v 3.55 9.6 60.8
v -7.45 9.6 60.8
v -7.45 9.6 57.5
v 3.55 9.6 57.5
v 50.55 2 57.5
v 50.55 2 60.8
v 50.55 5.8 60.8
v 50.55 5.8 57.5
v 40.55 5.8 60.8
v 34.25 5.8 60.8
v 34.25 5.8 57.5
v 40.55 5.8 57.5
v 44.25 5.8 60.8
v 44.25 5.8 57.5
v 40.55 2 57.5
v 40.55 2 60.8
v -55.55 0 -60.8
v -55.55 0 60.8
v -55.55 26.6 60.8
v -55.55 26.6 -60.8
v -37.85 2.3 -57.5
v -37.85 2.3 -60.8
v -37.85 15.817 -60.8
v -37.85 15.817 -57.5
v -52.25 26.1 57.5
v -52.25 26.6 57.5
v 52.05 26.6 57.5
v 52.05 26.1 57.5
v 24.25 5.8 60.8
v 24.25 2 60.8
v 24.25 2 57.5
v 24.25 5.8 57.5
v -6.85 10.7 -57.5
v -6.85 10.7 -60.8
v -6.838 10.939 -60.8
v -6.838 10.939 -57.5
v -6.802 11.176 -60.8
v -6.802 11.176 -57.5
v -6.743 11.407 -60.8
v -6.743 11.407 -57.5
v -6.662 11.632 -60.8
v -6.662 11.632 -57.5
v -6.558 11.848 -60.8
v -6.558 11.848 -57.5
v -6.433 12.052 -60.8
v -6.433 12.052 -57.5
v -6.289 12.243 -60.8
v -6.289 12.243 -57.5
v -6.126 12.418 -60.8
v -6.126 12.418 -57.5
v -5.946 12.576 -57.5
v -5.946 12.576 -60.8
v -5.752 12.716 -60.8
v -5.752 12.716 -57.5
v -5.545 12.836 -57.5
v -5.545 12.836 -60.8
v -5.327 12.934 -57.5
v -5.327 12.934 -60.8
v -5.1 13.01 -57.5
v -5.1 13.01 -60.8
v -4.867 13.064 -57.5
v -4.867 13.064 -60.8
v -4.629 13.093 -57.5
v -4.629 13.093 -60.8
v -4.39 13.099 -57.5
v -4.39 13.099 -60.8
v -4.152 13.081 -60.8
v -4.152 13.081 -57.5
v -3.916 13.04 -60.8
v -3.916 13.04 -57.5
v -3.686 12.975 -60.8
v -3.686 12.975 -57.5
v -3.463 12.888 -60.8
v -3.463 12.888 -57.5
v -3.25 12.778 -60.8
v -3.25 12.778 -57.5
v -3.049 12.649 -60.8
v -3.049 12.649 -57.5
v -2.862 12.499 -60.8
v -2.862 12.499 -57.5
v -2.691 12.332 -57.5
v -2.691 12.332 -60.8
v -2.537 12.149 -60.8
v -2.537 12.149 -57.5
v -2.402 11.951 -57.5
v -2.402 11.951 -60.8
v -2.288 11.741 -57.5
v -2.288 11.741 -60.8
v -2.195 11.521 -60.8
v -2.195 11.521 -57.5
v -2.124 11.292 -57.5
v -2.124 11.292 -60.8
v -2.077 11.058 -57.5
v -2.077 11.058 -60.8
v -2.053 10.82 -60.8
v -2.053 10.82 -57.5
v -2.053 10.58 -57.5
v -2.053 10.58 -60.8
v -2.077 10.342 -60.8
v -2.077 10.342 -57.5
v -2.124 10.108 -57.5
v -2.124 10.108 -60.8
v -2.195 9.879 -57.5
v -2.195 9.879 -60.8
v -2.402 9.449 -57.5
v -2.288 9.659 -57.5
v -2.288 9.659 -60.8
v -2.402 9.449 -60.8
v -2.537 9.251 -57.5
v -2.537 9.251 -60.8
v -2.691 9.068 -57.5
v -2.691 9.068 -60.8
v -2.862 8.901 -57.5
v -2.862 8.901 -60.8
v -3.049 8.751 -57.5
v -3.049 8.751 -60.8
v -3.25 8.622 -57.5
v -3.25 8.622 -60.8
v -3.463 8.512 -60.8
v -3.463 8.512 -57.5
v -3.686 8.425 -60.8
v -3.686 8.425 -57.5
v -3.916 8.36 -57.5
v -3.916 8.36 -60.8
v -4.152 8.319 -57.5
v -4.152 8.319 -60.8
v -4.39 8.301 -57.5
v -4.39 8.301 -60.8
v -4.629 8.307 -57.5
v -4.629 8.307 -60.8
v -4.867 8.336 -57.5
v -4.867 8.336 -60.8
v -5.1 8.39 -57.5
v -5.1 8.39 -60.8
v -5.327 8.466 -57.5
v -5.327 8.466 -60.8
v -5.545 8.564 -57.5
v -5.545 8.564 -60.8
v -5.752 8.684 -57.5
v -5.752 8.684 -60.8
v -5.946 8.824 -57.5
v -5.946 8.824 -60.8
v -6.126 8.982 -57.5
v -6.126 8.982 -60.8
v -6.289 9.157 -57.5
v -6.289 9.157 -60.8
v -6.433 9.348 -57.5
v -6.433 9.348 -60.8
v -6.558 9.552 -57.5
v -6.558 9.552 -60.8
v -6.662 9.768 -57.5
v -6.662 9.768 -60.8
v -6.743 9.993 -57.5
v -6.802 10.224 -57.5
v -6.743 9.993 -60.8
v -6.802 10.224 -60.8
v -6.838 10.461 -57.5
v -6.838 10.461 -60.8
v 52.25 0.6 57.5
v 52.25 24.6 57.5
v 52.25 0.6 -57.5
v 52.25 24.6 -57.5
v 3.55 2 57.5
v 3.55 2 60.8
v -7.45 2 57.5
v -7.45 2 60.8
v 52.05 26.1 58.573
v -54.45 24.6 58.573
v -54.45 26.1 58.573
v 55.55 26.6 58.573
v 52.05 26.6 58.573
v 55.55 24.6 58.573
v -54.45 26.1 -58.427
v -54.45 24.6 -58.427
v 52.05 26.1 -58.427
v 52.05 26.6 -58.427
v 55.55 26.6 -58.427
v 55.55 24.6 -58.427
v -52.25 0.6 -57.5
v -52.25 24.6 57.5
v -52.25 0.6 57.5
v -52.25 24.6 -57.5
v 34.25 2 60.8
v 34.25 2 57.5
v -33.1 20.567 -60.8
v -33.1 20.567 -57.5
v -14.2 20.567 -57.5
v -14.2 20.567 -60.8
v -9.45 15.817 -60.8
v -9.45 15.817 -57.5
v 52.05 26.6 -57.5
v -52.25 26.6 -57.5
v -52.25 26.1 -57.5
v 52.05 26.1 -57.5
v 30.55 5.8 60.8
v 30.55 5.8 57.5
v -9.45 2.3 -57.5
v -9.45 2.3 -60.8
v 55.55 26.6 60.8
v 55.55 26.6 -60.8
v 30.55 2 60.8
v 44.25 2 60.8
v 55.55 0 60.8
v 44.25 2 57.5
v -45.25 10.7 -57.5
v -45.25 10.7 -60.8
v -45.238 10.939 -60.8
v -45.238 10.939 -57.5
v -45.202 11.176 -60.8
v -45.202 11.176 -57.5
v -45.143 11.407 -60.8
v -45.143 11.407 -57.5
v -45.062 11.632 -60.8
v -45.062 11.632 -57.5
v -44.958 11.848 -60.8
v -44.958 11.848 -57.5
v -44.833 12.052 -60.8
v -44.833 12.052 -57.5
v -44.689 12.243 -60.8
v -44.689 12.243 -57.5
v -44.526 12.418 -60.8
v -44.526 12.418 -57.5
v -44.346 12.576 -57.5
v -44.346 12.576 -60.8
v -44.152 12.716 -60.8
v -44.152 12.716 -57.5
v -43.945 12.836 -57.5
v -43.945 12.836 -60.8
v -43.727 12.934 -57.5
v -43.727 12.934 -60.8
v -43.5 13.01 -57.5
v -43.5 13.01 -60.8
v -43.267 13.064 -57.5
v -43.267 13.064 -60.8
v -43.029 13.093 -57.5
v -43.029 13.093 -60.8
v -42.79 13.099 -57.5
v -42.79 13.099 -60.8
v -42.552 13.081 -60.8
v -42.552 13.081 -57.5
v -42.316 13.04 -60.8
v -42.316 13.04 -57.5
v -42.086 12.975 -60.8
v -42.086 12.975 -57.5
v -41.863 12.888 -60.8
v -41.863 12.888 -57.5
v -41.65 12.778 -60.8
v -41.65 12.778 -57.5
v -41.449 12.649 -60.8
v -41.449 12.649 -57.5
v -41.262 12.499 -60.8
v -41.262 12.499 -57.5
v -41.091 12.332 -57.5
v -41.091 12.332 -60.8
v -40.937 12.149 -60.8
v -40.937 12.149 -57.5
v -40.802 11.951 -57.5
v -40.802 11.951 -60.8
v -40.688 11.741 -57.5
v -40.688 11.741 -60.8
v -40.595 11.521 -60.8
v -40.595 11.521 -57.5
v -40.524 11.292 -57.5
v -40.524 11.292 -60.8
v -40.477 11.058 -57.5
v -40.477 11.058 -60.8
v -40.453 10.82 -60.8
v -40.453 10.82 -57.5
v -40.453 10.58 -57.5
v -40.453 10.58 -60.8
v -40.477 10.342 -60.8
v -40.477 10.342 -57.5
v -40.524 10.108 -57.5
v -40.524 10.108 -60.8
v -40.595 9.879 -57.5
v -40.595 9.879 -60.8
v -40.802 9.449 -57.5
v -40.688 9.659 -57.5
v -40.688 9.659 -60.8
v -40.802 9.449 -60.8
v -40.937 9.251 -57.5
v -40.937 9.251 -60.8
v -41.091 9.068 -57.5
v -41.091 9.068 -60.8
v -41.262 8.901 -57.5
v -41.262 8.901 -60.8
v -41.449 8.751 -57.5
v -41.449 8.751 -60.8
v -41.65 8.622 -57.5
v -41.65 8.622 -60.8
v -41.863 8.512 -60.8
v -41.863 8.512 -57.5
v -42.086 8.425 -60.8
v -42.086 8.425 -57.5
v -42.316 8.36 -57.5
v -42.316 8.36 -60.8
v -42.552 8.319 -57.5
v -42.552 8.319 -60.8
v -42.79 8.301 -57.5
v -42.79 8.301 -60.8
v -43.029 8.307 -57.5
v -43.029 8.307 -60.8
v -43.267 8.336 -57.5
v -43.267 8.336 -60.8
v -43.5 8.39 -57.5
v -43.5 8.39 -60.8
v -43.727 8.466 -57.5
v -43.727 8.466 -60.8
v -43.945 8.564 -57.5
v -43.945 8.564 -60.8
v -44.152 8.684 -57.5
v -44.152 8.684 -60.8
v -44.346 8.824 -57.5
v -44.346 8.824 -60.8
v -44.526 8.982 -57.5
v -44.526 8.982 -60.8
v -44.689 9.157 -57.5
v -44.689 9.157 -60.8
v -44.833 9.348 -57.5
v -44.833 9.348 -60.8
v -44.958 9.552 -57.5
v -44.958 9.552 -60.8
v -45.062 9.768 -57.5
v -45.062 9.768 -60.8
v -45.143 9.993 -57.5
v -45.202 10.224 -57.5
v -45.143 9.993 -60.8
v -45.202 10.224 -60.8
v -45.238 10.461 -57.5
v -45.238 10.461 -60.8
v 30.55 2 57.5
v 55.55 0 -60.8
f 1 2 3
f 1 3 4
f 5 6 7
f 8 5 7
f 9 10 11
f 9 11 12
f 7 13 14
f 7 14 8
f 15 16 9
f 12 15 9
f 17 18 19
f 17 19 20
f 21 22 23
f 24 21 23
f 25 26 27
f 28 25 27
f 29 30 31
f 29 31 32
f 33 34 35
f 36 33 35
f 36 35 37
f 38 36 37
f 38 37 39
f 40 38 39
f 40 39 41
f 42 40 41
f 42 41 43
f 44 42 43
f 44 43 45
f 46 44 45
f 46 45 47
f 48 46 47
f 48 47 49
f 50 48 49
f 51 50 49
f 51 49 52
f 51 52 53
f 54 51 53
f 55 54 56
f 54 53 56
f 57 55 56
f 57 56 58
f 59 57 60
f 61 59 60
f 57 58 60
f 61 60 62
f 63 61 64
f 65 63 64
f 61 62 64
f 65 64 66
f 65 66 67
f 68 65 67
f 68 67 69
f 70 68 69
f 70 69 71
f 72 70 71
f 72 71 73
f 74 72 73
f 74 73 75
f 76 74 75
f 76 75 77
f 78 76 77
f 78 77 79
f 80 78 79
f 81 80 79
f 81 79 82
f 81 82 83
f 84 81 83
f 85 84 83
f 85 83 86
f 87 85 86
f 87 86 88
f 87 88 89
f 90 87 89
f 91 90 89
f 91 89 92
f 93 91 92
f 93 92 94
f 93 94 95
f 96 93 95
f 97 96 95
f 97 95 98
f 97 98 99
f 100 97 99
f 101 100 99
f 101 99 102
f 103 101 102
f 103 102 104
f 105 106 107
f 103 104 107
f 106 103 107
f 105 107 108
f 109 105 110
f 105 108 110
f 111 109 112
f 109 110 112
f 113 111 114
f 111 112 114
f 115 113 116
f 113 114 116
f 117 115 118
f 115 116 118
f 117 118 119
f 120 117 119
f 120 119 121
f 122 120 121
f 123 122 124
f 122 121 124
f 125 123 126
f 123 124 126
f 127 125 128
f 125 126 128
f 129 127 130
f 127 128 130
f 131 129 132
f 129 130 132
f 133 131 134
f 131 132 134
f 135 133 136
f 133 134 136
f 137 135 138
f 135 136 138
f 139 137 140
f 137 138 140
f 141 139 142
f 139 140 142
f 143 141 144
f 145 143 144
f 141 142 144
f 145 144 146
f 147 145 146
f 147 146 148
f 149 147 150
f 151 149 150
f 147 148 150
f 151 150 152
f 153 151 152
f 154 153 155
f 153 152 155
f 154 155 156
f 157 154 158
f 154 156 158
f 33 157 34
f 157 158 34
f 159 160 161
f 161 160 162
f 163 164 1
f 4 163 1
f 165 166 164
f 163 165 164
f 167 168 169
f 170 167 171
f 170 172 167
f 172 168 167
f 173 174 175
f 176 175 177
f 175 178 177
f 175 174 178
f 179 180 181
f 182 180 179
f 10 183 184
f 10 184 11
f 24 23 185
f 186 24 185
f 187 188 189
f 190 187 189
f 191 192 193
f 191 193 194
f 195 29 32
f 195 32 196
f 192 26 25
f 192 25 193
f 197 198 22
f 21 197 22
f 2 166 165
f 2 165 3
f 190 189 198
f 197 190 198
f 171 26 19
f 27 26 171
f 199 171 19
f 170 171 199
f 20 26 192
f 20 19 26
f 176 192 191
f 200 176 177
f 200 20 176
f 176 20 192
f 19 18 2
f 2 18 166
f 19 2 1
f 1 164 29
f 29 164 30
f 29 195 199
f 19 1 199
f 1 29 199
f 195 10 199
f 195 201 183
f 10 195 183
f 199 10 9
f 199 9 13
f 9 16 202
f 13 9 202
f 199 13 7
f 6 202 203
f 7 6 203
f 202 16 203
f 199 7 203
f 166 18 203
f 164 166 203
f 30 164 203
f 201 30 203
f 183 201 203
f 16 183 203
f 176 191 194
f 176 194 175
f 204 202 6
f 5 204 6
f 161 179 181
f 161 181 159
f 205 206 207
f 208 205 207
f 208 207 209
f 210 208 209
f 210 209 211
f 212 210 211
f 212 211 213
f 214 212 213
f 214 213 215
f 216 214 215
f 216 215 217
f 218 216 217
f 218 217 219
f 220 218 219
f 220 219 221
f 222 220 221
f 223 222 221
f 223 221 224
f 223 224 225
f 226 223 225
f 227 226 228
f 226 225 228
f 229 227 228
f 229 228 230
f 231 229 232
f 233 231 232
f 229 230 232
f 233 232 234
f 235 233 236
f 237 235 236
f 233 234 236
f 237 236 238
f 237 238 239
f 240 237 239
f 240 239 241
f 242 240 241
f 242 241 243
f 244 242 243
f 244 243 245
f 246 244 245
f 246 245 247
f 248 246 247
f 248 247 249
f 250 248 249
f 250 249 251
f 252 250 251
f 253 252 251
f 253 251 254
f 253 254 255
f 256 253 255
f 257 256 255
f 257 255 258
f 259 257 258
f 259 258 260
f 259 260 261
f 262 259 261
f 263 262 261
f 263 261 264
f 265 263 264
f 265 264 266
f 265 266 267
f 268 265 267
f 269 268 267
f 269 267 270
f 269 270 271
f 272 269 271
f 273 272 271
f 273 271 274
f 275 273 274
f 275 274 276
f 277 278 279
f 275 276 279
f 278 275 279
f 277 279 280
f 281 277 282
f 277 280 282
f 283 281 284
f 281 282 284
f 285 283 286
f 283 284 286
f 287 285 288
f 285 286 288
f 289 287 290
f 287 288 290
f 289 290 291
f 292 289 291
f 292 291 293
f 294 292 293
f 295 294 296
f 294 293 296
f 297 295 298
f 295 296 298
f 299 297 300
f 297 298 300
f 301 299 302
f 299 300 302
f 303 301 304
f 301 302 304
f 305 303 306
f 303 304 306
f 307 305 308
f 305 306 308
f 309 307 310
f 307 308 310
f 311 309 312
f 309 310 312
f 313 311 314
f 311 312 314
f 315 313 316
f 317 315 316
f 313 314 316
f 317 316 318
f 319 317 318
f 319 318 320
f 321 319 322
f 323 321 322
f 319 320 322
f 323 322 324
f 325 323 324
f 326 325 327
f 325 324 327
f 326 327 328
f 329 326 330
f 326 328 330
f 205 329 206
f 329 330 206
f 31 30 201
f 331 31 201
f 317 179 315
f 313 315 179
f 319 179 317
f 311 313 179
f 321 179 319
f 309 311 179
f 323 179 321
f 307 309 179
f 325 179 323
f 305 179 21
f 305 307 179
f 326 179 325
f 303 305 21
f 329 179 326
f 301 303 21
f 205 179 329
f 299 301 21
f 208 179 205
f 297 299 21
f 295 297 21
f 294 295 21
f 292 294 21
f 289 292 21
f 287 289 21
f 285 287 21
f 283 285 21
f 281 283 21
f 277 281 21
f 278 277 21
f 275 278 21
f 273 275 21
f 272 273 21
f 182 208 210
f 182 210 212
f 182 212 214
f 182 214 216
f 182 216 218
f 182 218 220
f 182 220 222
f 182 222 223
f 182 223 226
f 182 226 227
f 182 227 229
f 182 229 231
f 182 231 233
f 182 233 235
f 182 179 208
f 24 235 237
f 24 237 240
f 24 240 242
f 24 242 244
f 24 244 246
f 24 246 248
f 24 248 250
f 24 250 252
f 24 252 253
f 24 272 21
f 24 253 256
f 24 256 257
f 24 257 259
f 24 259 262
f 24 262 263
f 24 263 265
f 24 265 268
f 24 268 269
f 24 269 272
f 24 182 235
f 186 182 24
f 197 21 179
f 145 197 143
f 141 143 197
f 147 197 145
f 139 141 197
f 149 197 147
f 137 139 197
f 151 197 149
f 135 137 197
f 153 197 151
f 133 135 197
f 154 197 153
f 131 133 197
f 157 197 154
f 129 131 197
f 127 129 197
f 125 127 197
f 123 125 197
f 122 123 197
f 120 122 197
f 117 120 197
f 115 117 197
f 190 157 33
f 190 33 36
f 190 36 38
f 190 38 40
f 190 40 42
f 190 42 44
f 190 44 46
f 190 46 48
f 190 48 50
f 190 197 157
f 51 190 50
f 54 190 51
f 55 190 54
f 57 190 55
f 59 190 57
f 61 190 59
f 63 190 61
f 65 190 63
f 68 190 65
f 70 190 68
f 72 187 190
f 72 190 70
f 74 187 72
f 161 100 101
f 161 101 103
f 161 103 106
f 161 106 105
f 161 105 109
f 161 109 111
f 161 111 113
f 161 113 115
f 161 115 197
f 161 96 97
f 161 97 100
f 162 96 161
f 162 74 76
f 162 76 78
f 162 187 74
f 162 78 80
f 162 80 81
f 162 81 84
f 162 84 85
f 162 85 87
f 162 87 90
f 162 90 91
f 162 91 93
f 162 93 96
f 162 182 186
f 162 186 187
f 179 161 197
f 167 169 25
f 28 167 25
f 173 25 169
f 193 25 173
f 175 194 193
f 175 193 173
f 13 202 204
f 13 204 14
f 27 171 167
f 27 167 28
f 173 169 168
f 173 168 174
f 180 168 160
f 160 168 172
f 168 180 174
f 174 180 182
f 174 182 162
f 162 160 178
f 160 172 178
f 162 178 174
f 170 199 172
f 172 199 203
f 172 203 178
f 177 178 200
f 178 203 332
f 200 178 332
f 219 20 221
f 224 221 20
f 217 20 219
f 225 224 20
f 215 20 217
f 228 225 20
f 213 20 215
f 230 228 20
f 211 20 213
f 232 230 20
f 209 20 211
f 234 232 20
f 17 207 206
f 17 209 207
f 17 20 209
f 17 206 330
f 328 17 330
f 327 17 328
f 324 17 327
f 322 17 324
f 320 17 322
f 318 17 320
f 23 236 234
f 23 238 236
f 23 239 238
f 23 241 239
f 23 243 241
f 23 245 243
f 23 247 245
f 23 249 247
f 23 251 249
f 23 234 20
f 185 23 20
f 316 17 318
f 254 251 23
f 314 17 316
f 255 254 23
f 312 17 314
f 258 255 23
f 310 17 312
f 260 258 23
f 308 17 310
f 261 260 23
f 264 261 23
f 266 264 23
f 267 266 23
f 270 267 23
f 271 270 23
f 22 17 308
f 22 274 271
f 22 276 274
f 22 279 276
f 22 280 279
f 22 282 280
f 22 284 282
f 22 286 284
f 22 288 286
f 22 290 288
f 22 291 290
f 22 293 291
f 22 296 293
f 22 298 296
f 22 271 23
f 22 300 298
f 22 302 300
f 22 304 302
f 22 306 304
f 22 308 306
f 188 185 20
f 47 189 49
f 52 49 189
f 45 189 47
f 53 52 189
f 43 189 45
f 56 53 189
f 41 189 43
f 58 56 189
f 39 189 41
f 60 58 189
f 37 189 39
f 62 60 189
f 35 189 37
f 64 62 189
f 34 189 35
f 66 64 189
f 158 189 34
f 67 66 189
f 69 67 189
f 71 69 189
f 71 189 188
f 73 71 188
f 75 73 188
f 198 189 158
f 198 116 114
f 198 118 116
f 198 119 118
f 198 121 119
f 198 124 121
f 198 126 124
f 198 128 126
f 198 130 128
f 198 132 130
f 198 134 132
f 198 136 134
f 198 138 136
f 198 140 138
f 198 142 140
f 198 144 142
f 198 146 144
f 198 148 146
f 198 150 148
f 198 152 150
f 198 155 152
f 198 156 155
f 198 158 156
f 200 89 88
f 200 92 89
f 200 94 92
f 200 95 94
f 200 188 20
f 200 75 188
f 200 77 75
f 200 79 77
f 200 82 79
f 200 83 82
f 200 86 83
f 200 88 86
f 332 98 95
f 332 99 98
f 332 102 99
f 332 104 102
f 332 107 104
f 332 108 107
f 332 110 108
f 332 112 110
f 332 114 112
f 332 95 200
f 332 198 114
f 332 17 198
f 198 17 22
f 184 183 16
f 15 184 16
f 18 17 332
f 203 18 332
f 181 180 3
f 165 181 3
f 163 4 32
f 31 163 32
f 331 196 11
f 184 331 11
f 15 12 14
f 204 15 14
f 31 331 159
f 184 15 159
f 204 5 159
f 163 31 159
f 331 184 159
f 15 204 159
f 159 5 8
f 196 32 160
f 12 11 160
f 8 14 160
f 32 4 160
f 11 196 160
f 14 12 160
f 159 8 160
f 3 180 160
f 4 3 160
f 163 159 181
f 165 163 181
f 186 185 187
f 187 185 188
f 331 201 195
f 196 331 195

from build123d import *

# Parameters (mm, degrees)
SKETCH1_W           = 111.1
SKETCH1_H           = 121.6
BOSS_EXTRUDE1_DEPTH = 26.6
SKETCH2_W           = 104.5
SKETCH2_H           = 115
CUT_EXTRUDE1_DEPTH  = 26
SKETCH5_R           = 2.4
CUT_EXTRUDE3_DEPTH  = 4
SKETCH7_W           = 6.3
SKETCH7_H           = 3.8
SKETCH7_W_2         = 11
SKETCH7_H_2         = 7.6
CUT_EXTRUDE4_DEPTH  = 4
SKETCH8_W           = 117
SKETCH8_H           = 1.5
CUT_EXTRUDE5_DEPTH  = 110
SKETCH9_W           = 117
SKETCH9_H           = 0.5
CUT_EXTRUDE6_DEPTH  = 3.5


with BuildPart() as part:
    # Sketch1 → Boss-Extrude1 (new body)
    with BuildSketch(Plane(origin=(0, 0, 0), x_dir=(1, 0, 0), z_dir=(0, 1, 0))):
        Rectangle(SKETCH1_W, SKETCH1_H)
    extrude(amount=BOSS_EXTRUDE1_DEPTH)

    # Sketch2 → Cut-Extrude1 (cut)
    with BuildSketch(Plane(origin=(0, 26.6, 0), x_dir=(1, 0, 0), z_dir=(0, 1, 0))):
        Rectangle(SKETCH2_W, SKETCH2_H)
    extrude(amount=-CUT_EXTRUDE1_DEPTH, mode=Mode.SUBTRACT)

    # Sketch5 → Cut-Extrude3 (cut)
    with BuildSketch(Plane(origin=(0, 0, -60.8), x_dir=(-1, 0, 0), z_dir=(0, 0, -1))):
        with Locations((42.85, 10.7)):
            Circle(SKETCH5_R)
        with Locations((4.45, 10.7)):
            Circle(SKETCH5_R)
        Polygon((9.45, 2.3), (37.85, 2.3), (37.85, 15.816960095), (33.1, 20.566960095), (14.2, 20.566960095), (9.45, 15.816960095), align=None)
    extrude(amount=-CUT_EXTRUDE3_DEPTH, mode=Mode.SUBTRACT)

    # Sketch7 → Cut-Extrude4 (cut)
    with BuildSketch(Plane.XY.offset(60.8)):
        with Locations((47.4, 3.9)):
            Rectangle(SKETCH7_W, SKETCH7_H)
        with Locations((37.4, 3.9)):
            Rectangle(SKETCH7_W, SKETCH7_H)
        with Locations((27.4, 3.9)):
            Rectangle(SKETCH7_W, SKETCH7_H)
        with Locations((-1.95, 5.8)):
            Rectangle(SKETCH7_W_2, SKETCH7_H_2)
    extrude(amount=-CUT_EXTRUDE4_DEPTH, mode=Mode.SUBTRACT)

    # Sketch8 → Cut-Extrude5 (cut)
    with BuildSketch(Plane(origin=(55.55, 0, 0), x_dir=(0, 0, -1), z_dir=(1, 0, 0))):
        with Locations((-0.072921922, 25.35)):
            Rectangle(SKETCH8_W, SKETCH8_H)
    extrude(amount=-CUT_EXTRUDE5_DEPTH, mode=Mode.SUBTRACT)

    # Sketch9 → Cut-Extrude6 (cut)
    with BuildSketch(Plane(origin=(55.55, 0, 0), x_dir=(0, 0, -1), z_dir=(1, 0, 0))):
        with Locations((-0.072921922, 26.35)):
            Rectangle(SKETCH9_W, SKETCH9_H)
    extrude(amount=-CUT_EXTRUDE6_DEPTH, mode=Mode.SUBTRACT)


solid = part.part
